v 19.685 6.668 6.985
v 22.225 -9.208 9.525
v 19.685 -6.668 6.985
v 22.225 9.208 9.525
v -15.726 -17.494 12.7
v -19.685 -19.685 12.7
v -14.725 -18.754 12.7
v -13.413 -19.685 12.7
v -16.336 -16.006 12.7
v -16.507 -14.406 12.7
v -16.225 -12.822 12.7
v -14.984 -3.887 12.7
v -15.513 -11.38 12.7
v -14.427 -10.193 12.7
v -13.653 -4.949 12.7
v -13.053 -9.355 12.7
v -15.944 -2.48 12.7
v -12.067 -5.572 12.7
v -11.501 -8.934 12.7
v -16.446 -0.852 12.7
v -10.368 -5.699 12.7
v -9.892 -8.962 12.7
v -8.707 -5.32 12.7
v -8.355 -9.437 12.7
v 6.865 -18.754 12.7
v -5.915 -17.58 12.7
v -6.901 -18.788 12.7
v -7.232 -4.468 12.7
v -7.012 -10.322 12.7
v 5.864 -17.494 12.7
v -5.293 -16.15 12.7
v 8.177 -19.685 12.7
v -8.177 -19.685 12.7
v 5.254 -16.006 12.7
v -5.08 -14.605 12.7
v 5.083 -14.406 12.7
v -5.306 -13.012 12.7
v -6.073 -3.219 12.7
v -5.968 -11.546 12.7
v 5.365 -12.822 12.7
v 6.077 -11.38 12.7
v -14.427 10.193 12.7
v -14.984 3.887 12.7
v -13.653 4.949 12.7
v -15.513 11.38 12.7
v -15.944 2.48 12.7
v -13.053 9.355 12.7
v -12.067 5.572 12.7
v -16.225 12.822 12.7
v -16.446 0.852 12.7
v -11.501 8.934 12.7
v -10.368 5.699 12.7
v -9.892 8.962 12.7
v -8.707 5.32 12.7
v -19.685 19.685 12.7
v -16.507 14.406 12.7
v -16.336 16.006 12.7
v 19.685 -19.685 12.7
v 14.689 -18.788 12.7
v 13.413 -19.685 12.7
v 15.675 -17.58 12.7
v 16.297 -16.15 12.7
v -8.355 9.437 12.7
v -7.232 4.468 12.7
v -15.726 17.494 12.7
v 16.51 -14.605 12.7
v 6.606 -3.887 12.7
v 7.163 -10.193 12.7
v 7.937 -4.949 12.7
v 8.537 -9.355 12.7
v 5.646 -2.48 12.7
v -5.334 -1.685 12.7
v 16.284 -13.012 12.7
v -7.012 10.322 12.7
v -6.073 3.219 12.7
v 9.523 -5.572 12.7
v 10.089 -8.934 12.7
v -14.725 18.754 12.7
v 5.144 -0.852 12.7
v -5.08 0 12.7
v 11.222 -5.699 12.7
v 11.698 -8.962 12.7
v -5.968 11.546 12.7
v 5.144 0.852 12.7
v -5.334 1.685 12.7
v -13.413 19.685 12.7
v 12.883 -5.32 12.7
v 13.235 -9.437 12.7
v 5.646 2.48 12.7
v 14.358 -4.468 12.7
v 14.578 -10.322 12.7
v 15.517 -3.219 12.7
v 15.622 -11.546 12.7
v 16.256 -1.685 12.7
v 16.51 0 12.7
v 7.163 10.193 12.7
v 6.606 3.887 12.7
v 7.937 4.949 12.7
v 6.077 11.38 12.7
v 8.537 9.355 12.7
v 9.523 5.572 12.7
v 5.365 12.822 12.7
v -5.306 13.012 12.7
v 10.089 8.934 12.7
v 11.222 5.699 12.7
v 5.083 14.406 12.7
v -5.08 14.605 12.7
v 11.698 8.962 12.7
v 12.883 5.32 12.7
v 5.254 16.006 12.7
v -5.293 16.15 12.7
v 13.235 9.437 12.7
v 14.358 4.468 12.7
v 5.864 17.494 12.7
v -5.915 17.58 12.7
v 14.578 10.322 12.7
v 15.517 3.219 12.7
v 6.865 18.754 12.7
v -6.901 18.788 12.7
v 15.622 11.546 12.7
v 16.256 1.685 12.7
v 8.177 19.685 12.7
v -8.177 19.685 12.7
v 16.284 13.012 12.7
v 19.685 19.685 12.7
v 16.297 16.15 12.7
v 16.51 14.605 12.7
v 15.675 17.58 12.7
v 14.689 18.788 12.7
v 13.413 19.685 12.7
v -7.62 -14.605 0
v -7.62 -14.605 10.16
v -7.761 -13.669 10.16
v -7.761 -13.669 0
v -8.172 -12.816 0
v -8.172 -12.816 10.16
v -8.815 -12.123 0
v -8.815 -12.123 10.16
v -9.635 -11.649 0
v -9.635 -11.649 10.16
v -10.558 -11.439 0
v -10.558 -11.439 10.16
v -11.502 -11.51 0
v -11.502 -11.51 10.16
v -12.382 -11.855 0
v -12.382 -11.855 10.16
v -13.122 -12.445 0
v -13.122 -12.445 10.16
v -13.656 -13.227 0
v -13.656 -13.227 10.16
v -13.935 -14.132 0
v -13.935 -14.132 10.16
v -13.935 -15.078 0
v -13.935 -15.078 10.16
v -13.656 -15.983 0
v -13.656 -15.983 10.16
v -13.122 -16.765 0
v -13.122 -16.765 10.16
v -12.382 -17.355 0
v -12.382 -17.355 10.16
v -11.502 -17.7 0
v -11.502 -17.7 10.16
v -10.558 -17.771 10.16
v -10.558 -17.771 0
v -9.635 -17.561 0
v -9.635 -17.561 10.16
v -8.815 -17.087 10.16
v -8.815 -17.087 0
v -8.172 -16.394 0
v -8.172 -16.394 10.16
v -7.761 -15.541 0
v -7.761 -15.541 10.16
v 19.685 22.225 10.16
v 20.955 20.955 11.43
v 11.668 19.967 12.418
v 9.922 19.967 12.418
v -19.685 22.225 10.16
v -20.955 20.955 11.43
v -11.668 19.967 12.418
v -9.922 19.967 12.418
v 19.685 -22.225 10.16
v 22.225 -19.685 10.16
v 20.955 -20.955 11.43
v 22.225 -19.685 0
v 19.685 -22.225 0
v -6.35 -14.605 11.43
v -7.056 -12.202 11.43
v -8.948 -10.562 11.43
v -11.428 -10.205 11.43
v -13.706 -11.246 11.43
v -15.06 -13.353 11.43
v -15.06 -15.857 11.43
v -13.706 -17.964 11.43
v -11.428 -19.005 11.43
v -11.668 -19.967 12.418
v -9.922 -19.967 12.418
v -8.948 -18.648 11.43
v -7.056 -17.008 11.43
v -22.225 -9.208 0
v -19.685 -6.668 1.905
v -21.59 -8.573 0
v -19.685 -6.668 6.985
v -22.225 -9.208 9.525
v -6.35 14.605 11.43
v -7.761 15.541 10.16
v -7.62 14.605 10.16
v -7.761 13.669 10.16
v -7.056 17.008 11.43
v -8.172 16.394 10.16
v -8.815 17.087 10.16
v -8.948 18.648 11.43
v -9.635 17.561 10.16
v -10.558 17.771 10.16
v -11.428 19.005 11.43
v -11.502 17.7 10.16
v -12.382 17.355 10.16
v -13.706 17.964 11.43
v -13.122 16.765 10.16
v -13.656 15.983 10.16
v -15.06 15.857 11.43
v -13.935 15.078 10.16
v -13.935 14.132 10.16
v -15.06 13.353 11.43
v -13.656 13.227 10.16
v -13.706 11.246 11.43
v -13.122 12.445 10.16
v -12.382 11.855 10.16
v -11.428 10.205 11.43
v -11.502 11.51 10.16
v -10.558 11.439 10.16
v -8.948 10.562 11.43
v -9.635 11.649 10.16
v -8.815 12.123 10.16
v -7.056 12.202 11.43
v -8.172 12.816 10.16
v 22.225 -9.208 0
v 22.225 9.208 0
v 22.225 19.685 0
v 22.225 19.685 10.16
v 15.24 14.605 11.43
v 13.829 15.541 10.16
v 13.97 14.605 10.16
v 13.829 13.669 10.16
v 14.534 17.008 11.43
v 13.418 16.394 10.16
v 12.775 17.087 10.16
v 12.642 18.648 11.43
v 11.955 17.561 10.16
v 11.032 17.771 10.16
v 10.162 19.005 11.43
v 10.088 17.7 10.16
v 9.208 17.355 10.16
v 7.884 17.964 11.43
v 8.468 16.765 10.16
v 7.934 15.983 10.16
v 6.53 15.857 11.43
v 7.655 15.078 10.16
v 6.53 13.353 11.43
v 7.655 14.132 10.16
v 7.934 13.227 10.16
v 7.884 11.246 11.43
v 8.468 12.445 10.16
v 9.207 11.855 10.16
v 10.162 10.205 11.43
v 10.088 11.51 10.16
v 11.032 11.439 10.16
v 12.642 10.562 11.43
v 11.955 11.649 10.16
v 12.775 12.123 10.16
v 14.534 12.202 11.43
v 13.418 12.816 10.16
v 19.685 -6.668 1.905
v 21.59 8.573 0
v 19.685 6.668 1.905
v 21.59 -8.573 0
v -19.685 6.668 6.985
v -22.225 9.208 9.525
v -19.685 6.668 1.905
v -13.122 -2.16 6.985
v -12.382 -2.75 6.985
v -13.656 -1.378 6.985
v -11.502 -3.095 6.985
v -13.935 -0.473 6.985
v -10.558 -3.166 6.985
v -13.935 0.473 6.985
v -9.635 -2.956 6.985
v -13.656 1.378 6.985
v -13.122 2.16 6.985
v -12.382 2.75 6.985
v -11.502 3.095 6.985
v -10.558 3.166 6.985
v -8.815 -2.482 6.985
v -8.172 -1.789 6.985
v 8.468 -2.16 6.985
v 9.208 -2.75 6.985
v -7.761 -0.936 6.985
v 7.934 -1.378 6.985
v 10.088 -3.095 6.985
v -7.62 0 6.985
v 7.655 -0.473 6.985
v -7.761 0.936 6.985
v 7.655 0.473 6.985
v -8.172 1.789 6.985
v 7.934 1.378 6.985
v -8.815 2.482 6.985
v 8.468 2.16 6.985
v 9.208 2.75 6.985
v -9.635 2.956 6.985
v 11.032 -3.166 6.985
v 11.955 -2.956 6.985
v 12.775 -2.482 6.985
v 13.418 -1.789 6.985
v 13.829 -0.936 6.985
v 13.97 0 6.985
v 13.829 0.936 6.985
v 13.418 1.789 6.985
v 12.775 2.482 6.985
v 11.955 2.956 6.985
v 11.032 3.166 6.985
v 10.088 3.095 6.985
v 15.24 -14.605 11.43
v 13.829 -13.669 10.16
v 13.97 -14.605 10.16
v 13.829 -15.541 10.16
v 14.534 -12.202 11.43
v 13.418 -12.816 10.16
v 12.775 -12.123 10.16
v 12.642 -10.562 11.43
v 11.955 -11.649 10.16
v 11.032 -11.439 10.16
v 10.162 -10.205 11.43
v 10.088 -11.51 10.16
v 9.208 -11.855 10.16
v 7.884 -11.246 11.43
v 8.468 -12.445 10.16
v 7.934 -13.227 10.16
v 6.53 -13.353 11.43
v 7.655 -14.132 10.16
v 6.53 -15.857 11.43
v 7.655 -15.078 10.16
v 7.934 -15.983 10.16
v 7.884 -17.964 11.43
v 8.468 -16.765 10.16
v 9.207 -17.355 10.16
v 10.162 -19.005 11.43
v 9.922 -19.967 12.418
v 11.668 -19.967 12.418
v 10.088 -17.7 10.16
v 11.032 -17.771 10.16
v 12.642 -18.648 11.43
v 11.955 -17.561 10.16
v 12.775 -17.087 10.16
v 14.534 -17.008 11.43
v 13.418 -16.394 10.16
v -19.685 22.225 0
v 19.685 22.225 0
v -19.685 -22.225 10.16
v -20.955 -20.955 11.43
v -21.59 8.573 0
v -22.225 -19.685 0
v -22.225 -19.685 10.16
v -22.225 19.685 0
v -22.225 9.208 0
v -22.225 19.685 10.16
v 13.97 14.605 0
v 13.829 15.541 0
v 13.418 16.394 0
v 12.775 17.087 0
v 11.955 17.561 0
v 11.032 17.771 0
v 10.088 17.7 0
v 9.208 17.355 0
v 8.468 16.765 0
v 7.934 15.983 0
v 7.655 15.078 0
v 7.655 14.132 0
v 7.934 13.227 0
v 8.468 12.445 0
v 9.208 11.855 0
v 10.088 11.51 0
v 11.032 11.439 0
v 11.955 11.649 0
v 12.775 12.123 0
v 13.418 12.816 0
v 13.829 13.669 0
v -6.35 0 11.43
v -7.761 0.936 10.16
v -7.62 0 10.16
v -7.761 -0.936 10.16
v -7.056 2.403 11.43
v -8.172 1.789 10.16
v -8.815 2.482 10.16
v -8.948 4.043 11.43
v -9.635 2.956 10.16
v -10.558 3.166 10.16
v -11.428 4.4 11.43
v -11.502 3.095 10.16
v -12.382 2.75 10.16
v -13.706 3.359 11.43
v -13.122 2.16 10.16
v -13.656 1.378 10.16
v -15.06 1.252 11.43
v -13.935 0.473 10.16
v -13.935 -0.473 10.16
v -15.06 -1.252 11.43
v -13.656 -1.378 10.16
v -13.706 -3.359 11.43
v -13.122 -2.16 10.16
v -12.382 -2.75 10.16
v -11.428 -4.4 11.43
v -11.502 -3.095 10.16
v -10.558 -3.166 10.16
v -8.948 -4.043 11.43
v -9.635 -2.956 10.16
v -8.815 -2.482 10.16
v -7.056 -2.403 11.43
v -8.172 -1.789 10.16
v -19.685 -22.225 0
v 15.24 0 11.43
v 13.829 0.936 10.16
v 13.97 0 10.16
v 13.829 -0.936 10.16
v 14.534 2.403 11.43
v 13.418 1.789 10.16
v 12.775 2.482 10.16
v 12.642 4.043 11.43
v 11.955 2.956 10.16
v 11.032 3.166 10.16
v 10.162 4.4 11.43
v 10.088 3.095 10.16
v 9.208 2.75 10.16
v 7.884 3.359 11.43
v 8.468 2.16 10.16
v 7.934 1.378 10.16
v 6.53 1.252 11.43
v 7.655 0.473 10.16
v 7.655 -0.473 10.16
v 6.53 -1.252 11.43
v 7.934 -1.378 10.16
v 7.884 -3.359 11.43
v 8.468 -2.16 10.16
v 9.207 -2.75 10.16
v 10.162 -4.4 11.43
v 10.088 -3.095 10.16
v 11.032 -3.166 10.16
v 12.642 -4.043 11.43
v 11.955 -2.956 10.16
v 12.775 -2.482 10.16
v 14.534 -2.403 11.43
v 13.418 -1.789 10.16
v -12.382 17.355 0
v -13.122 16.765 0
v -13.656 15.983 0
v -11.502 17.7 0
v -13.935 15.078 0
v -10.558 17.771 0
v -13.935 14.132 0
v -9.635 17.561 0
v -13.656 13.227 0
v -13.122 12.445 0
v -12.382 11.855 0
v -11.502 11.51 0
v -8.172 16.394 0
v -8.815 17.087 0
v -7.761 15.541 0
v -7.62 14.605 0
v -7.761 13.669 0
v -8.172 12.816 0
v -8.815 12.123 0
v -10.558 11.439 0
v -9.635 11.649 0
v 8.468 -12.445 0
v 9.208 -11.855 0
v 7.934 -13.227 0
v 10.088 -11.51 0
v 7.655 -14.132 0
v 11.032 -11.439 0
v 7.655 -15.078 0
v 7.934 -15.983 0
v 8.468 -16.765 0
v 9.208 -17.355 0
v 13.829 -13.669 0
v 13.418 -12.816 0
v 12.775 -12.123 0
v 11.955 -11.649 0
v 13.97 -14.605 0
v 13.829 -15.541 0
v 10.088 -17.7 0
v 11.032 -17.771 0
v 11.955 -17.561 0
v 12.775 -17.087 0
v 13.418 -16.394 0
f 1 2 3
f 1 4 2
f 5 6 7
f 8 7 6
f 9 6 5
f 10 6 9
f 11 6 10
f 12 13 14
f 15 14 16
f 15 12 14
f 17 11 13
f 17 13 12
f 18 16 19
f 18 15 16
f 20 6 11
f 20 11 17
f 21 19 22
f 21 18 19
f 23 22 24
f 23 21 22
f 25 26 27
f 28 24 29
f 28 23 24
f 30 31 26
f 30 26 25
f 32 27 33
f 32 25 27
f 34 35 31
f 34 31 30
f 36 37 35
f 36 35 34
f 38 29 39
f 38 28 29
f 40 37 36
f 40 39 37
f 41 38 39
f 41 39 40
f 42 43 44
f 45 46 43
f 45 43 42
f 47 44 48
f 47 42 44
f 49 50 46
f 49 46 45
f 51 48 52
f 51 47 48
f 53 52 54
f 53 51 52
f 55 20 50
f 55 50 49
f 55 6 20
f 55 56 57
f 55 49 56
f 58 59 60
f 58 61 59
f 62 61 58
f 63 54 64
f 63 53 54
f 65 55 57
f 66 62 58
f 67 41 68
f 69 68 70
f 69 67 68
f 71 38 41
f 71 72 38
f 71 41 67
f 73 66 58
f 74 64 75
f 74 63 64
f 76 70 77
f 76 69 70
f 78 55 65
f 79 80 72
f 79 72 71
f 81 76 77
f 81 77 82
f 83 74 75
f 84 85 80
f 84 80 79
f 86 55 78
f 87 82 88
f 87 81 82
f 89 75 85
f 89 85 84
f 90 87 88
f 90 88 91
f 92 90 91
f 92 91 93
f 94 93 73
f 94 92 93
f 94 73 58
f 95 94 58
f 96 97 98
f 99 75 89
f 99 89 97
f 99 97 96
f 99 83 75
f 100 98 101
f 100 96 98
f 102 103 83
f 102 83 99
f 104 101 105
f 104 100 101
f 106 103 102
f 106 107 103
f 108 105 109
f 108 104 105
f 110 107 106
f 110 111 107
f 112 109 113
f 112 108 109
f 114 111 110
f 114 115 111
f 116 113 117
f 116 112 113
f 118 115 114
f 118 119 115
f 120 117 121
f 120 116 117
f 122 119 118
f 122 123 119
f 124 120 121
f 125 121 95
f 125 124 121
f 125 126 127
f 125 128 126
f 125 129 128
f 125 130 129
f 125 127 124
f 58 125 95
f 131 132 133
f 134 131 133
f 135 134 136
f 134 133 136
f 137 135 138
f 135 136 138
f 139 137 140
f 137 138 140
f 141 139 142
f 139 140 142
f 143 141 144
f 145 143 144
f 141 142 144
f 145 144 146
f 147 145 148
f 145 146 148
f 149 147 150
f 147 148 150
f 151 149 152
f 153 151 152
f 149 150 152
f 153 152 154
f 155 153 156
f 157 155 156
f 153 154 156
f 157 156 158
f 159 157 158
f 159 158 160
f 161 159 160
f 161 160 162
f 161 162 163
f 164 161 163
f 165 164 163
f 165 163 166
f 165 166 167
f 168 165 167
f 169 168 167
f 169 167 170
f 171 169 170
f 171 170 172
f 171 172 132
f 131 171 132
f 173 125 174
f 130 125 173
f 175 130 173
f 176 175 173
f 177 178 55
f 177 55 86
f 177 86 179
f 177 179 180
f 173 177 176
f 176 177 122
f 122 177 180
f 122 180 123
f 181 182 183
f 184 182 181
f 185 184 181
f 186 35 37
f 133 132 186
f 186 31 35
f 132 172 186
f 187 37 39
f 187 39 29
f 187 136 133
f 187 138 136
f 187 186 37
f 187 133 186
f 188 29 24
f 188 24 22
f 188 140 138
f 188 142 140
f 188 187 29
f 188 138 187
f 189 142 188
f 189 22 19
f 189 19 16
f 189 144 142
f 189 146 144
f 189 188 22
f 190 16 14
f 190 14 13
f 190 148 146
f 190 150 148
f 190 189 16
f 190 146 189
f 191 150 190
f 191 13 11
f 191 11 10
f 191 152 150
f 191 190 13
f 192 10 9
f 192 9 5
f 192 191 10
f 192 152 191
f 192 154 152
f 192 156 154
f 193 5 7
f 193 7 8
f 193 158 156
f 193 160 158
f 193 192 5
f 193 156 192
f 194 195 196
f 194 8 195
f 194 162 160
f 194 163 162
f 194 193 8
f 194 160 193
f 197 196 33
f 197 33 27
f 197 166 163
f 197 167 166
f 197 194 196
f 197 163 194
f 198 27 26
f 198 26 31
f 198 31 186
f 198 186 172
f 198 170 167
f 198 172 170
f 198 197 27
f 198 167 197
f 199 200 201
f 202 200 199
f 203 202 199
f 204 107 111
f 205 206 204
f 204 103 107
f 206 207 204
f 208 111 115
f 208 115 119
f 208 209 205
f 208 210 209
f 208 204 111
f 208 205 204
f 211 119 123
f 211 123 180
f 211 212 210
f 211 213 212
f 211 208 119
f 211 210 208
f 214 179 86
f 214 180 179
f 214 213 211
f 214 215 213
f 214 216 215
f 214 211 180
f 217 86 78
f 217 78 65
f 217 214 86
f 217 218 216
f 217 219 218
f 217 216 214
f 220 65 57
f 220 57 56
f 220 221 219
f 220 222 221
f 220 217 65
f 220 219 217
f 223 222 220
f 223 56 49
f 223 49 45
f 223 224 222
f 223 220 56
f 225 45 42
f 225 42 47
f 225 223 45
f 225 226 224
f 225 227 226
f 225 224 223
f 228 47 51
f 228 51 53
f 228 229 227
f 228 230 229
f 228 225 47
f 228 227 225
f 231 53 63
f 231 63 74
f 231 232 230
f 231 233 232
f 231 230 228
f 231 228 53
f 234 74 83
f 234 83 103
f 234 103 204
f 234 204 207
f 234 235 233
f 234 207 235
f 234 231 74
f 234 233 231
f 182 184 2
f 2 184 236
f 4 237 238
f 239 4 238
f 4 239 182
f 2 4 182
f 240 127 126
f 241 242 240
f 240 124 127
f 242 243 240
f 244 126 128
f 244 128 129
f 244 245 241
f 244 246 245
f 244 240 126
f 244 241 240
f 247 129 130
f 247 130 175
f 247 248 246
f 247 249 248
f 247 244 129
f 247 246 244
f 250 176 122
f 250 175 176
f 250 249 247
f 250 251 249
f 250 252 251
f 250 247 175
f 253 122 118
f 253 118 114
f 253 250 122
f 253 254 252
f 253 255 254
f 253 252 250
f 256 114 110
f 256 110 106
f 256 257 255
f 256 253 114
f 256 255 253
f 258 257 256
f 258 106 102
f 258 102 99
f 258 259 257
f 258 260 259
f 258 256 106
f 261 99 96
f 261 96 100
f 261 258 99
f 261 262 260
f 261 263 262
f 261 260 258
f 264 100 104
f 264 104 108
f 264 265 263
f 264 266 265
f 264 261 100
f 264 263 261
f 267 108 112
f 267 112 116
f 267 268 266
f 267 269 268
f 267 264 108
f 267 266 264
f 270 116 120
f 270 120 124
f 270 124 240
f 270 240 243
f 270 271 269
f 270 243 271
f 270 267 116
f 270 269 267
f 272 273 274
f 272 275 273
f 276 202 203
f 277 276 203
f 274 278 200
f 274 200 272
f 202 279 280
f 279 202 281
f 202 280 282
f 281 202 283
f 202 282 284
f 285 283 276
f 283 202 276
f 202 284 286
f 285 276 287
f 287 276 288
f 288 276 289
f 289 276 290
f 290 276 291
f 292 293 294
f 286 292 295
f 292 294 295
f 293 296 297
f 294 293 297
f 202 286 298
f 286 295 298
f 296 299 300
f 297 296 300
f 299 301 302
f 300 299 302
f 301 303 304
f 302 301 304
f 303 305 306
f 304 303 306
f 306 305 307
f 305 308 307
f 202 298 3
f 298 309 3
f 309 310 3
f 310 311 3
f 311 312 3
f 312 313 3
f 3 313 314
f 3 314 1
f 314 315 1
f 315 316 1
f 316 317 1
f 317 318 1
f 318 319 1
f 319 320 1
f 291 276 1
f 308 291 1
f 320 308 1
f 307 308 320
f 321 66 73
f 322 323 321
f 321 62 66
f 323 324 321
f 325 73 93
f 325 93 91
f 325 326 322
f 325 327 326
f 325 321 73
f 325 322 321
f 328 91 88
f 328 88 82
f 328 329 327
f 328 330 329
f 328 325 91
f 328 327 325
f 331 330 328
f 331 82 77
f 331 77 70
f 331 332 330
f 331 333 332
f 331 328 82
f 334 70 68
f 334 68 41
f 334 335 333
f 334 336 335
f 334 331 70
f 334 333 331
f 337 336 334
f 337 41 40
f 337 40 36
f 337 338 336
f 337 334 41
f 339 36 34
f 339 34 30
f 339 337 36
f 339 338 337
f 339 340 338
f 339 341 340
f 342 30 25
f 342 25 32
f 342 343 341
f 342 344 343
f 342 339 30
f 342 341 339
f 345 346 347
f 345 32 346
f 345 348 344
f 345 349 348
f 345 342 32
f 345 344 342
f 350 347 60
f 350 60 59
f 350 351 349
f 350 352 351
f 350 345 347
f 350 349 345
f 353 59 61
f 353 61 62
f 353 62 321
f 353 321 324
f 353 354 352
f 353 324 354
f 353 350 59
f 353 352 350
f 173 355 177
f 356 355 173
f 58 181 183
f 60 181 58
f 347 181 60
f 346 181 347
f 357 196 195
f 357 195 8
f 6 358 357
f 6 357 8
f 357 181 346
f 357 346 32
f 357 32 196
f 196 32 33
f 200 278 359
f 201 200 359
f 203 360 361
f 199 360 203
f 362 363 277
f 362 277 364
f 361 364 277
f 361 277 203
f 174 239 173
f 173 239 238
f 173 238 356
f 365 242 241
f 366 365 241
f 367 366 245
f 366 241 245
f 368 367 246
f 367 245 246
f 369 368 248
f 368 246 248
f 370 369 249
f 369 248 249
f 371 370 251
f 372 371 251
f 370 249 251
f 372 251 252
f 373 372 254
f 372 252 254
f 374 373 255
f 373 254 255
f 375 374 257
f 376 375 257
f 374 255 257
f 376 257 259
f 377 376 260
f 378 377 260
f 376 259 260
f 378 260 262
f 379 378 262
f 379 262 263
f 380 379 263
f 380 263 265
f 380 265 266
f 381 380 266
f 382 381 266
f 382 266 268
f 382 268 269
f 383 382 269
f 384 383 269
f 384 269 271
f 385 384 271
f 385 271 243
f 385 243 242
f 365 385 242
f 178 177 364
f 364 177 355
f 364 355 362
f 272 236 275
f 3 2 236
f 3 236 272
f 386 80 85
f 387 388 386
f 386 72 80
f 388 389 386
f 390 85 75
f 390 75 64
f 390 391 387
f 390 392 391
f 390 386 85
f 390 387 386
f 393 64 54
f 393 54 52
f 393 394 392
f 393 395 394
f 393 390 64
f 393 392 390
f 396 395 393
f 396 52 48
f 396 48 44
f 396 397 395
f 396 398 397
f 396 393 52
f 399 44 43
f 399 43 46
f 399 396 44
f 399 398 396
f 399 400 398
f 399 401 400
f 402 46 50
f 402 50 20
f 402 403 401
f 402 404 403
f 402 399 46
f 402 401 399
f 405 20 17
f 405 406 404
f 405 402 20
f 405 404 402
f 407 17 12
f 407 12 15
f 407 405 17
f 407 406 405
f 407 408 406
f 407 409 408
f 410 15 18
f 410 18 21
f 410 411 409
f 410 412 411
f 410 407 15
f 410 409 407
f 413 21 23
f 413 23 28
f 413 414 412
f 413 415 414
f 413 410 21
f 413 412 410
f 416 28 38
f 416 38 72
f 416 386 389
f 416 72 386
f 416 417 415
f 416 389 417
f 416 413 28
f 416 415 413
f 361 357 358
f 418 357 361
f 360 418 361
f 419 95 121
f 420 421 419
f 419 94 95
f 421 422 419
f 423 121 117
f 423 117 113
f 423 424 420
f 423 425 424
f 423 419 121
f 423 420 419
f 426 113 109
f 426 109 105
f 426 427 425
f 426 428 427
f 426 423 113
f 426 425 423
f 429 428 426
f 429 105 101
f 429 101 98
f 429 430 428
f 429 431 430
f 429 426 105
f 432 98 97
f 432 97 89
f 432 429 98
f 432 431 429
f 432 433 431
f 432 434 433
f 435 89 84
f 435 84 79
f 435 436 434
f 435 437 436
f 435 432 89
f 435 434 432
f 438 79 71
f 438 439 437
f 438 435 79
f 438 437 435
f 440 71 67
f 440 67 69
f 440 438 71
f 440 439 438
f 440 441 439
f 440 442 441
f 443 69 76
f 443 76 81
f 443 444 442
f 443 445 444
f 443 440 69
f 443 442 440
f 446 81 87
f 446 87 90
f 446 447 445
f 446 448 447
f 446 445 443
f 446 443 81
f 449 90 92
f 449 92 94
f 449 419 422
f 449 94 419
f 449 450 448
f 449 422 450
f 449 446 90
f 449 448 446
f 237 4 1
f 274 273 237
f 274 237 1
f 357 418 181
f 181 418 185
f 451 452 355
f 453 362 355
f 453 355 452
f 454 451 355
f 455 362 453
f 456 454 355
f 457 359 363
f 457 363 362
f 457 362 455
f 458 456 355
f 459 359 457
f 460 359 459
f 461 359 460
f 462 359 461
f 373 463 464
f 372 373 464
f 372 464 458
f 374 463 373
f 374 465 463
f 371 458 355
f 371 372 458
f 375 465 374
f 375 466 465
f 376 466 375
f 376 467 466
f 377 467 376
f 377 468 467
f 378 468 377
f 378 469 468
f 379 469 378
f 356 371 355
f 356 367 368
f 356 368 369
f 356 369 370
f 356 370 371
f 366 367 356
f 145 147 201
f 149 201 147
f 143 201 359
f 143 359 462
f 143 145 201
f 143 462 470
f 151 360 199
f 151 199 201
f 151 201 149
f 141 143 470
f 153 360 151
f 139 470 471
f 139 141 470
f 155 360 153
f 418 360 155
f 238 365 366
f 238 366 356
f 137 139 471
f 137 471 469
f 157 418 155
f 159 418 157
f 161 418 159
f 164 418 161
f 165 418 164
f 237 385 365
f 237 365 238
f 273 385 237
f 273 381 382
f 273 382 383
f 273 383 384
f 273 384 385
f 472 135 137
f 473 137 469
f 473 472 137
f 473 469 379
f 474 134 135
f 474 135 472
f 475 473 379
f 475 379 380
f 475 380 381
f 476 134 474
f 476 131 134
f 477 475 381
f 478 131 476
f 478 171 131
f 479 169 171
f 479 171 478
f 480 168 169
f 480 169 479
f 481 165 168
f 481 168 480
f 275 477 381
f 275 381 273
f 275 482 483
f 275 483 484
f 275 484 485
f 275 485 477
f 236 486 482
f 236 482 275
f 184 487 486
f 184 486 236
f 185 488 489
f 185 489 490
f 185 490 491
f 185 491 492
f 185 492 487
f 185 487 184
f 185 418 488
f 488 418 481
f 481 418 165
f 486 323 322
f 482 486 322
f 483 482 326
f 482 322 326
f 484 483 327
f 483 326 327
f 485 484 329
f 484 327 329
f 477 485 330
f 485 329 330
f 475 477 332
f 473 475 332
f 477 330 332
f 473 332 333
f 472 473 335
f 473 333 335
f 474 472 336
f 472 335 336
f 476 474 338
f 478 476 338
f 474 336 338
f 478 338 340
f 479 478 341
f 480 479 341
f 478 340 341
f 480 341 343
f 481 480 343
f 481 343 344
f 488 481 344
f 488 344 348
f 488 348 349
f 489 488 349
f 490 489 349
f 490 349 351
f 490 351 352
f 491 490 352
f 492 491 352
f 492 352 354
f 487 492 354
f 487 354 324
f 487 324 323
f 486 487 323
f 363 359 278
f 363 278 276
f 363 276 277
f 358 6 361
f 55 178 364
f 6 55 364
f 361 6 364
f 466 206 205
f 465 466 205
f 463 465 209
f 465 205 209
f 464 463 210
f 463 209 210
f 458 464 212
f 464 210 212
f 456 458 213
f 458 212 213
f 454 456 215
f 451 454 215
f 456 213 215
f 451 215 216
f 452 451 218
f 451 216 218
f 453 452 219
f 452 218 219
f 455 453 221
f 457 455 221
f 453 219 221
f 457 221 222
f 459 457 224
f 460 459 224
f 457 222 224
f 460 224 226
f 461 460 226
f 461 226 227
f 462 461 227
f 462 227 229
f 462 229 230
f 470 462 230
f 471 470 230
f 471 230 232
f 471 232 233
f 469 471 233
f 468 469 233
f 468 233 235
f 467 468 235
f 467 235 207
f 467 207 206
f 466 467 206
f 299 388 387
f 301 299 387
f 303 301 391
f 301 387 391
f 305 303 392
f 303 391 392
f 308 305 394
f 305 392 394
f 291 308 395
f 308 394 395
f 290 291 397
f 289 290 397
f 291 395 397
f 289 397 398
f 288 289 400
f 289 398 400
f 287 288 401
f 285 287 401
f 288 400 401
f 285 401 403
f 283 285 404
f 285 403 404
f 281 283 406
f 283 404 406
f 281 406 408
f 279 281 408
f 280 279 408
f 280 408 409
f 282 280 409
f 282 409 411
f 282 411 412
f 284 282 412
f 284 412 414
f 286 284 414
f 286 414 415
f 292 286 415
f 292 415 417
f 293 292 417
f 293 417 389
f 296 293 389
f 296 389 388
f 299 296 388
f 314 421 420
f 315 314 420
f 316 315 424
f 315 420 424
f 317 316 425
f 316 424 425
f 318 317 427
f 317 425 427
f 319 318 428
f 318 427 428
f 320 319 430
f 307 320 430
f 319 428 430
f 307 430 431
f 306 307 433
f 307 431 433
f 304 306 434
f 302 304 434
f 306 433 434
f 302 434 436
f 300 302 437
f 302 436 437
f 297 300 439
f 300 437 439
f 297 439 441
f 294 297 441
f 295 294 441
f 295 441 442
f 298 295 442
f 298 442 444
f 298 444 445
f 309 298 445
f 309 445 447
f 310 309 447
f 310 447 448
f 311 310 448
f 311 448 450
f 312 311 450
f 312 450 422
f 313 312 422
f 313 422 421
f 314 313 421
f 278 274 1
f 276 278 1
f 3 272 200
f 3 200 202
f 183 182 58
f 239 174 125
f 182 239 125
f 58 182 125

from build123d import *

# Parameters (mm, degrees)
F0_W          = 44.45
F0_H          = 44.45
F1_DEPTH      = 12.7
F2_W          = 13.335
F2_H          = 5.08
F3_DEPTH      = 76.2
F4_R          = 3.175
F5_DEPTH      = 25.4
F6_T1_DEPTH   = 57.5141495789
F6_T3_DEPTH   = 57.5141495789
F7_T1_DEPTH   = 5.08
F7_T3_DEPTH   = 13.335
F7_T5_DEPTH   = 23.2241495789
F7_T11_DEPTH  = 19.8670747894
F7_T16_DEPTH  = 11.6120747894
F7_T24_DEPTH  = 19.8670747894
F7_T28_DEPTH  = 11.6120747894
F7_T36_DEPTH  = 11.6120747894
F7_T41_DEPTH  = 19.8670747894
F7_T49_DEPTH  = 11.6120747894
F7_T54_DEPTH  = 19.8670747894
F7_T61_DEPTH  = 19.8670747894
F7_T65_DEPTH  = 11.6120747894
F7_T73_DEPTH  = 11.6120747894
F7_T78_DEPTH  = 19.8670747894
F7_T85_DEPTH  = 19.8670747894
F7_T90_DEPTH  = 11.6120747894
F7_T98_DEPTH  = 11.6120747894
F7_T103_DEPTH = 19.8670747894
F8_R          = 3.175
F9_DEPTH      = 1.905


# Not quite as in the source:
# - a fillet or chamfer that OpenCascade refuses, or shapes differently, is made with other operations: its cross-section is extruded or revolved along the edge and cut away or added


with BuildPart() as f1:
    # F0 (on Top) → F1 (new body)
    with BuildSketch(Plane.XY):
        Rectangle(F0_W, F0_H)
    extrude(amount=F1_DEPTH)

    # F2 (on face) → F3 (cut)
    with BuildSketch(Plane.YZ.offset(22.225)):
        with Locations((0, 4.445)):
            Rectangle(F2_W, F2_H)
    extrude(amount=-F3_DEPTH, mode=Mode.SUBTRACT)

    # F4 (on face) → F5 (cut)
    with BuildSketch(Plane.XY.offset(12.7)):
        with Locations((10.795, 14.605)):
            Circle(F4_R)
        with Locations((-10.795, 14.605)):
            Circle(F4_R)
        with Locations((-10.795, -14.605)):
            Circle(F4_R)
        with Locations((10.795, -14.605)):
            Circle(F4_R)
        with Locations((-10.795, 0)):
            Circle(F4_R)
        with Locations((10.795, 0)):
            Circle(F4_R)
    extrude(amount=-F5_DEPTH, mode=Mode.SUBTRACT)

    # F6: chamfer of 2.54 on 10 edges, made by hand

    # F6_s2 → F6_t1 (cut)
    with BuildSketch(Plane.XZ.offset(-28.7570747894)):
        Polygon((22.225, 10.16), (19.685, 12.7), (22.225, 12.7), align=None)
        Polygon((-19.685, 12.7), (-22.225, 10.16), (-22.225, 12.7), align=None)
    extrude(amount=F6_T1_DEPTH, mode=Mode.SUBTRACT)

    # F6_s4 → F6_t3 (cut)
    with BuildSketch(Plane.YZ.offset(-28.7570747894)):
        Polygon((-22.225, 10.16), (-19.685, 12.7), (-22.225, 12.7), align=None)
        Polygon((19.685, 12.7), (22.225, 10.16), (22.225, 12.7), align=None)
    extrude(amount=F6_T3_DEPTH, mode=Mode.SUBTRACT)

    # F6_s5 → F6_t6 (revolve, cut)
    with BuildSketch(Plane.XZ.offset(14.605)):
        Polygon((-5.08, 12.7), (-7.62, 10.16), (-7.62, 12.7), align=None)
    revolve(axis=Axis((-10.795, -14.605, 12.7), (0, 0, 1)), mode=Mode.SUBTRACT)

    # F6_s7 → F6_t8 (revolve, cut)
    with BuildSketch(Plane.XZ):
        Polygon((-5.08, 12.7), (-7.62, 10.16), (-7.62, 12.7), align=None)
    revolve(axis=Axis((-10.795, 0, 12.7), (0, 0, 1)), mode=Mode.SUBTRACT)

    # F6_s9 → F6_t10 (revolve, cut)
    with BuildSketch(Plane.XZ.offset(14.605)):
        Polygon((16.51, 12.7), (13.97, 10.16), (13.97, 12.7), align=None)
    revolve(axis=Axis((10.795, -14.605, 12.7), (0, 0, 1)), mode=Mode.SUBTRACT)

    # F6_s11 → F6_t12 (revolve, cut)
    with BuildSketch(Plane.XZ):
        Polygon((16.51, 12.7), (13.97, 10.16), (13.97, 12.7), align=None)
    revolve(axis=Axis((10.795, 0, 12.7), (0, 0, 1)), mode=Mode.SUBTRACT)

    # F6_s13 → F6_t14 (revolve, cut)
    with BuildSketch(Plane.XZ.offset(-14.605)):
        Polygon((-5.08, 12.7), (-7.62, 10.16), (-7.62, 12.7), align=None)
    revolve(axis=Axis((-10.795, 14.605, 12.7), (0, 0, 1)), mode=Mode.SUBTRACT)

    # F6_s15 → F6_t16 (revolve, cut)
    with BuildSketch(Plane.XZ.offset(-14.605)):
        Polygon((16.51, 12.7), (13.97, 10.16), (13.97, 12.7), align=None)
    revolve(axis=Axis((10.795, 14.605, 12.7), (0, 0, 1)), mode=Mode.SUBTRACT)

    # F7: chamfer of 2.54 on 12 edges, made by hand

    # F7_s2 → F7_t1 (cut)
    with BuildSketch(Plane.XY.offset(1.905)):
        Polygon((22.225, 9.2075), (19.685, 6.6675), (22.225, 6.6675), align=None)
        Polygon((22.225, -9.2075), (19.685, -6.6675), (22.225, -6.6675), align=None)
        Polygon((-19.685, 6.6675), (-22.225, 9.2075), (-22.225, 6.6675), align=None)
        Polygon((-19.685, -6.6675), (-22.225, -9.2075), (-22.225, -6.6675), align=None)
    extrude(amount=F7_T1_DEPTH, mode=Mode.SUBTRACT)

    # F7_s4 → F7_t3 (cut)
    with BuildSketch(Plane.XZ.offset(-6.6675)):
        Polygon((22.225, -0.635), (19.685, 1.905), (22.225, 1.905), align=None)
        Polygon((22.225, 9.525), (19.685, 6.985), (22.225, 6.985), align=None)
        Polygon((-19.685, 6.985), (-22.225, 9.525), (-22.225, 6.985), align=None)
        Polygon((-19.685, 1.905), (-22.225, -0.635), (-22.225, 1.905), align=None)
    extrude(amount=F7_T3_DEPTH, mode=Mode.SUBTRACT)

    # F7_s6 → F7_t5 (cut)
    with BuildSketch(Plane.XY.offset(-6.5320747894)):
        Polygon((-19.685, -22.225), (-22.225, -19.685), (-22.225, -22.225), align=None)
        Polygon((22.225, -19.685), (19.685, -22.225), (22.225, -22.225), align=None)
        Polygon((22.225, 19.685), (19.685, 22.225), (22.225, 22.225), align=None)
        Polygon((-19.685, 22.225), (-22.225, 19.685), (-22.225, 22.225), align=None)
    extrude(amount=F7_T5_DEPTH, mode=Mode.SUBTRACT)


with BuildPart() as f7_tool9:
    # F7_s10 → F7_t11 (new body)
    with BuildSketch(Plane.XZ.offset(6.6675)):
        Polygon((22.225, -0.635), (19.685, 1.905), (22.225, 1.905), align=None)
    extrude(amount=-F7_T11_DEPTH)

    split(bisect_by=Plane.XY, keep=Keep.TOP)

    split(bisect_by=Plane.XZ.offset(-6.6675), keep=Keep.BOTTOM)


with BuildPart() as f7_tool14:
    # F7_s15 → F7_t16 (new body)
    with BuildSketch(Plane.XY.offset(-4.6270747894)):
        Polygon((22.225, 9.2075), (19.685, 6.6675), (22.225, 6.6675), align=None)
    extrude(amount=F7_T16_DEPTH)

    split(bisect_by=Plane.XY, keep=Keep.TOP)

    split(bisect_by=Plane.XY.offset(1.905), keep=Keep.BOTTOM)


with BuildPart() as f7_tool9_1:
    add(f7_tool9.part)

    # F7_t19: intersect F7_tool14
    add(f7_tool14.part, mode=Mode.INTERSECT)


with BuildPart() as f1_1:
    add(f1.part)

    # F7_t7: cut F7_tool9
    add(f7_tool9_1.part, mode=Mode.SUBTRACT)


with BuildPart() as f7_tool22:
    # F7_s23 → F7_t24 (new body)
    with BuildSketch(Plane.XZ.offset(-13.1995747894)):
        Polygon((22.225, 9.525), (19.685, 6.985), (22.225, 6.985), align=None)
    extrude(amount=F7_T24_DEPTH)

    split(bisect_by=Plane.XZ.offset(-6.6675), keep=Keep.BOTTOM)


with BuildPart() as f7_tool26:
    # F7_s27 → F7_t28 (new body)
    with BuildSketch(Plane.XY.offset(1.905)):
        Polygon((22.225, 9.2075), (19.685, 6.6675), (22.225, 6.6675), align=None)
    extrude(amount=F7_T28_DEPTH)

    split(bisect_by=Plane(origin=(16.1925, 0, 16.1925), x_dir=(0, 1, 0), z_dir=(-0.7071067812, 0, -0.7071067812)), keep=Keep.TOP)

    split(bisect_by=Plane.XY.offset(6.985), keep=Keep.TOP)


with BuildPart() as f7_tool22_1:
    add(f7_tool22.part)

    # F7_t31: intersect F7_tool26
    add(f7_tool26.part, mode=Mode.INTERSECT)


with BuildPart() as f1_2:
    add(f1_1.part)

    # F7_t20: cut F7_tool22
    add(f7_tool22_1.part, mode=Mode.SUBTRACT)


with BuildPart() as f7_tool34:
    # F7_s35 → F7_t36 (new body)
    with BuildSketch(Plane.XY.offset(6.985)):
        Polygon((22.225, -9.2075), (19.685, -6.6675), (22.225, -6.6675), align=None)
    extrude(amount=-F7_T36_DEPTH)

    split(bisect_by=Plane.XY, keep=Keep.TOP)

    split(bisect_by=Plane.XY.offset(1.905), keep=Keep.BOTTOM)


with BuildPart() as f7_tool39:
    # F7_s40 → F7_t41 (new body)
    with BuildSketch(Plane.XZ.offset(13.1995747894)):
        Polygon((22.225, -0.635), (19.685, 1.905), (22.225, 1.905), align=None)
    extrude(amount=-F7_T41_DEPTH)

    split(bisect_by=Plane.XY, keep=Keep.TOP)

    split(bisect_by=Plane.XZ.offset(6.6675), keep=Keep.TOP)


with BuildPart() as f7_tool34_1:
    add(f7_tool34.part)

    # F7_t44: intersect F7_tool39
    add(f7_tool39.part, mode=Mode.INTERSECT)


with BuildPart() as f1_3:
    add(f1_2.part)

    # F7_t32: cut F7_tool34
    add(f7_tool34_1.part, mode=Mode.SUBTRACT)


with BuildPart() as f7_tool47:
    # F7_s48 → F7_t49 (new body)
    with BuildSketch(Plane.XY.offset(13.5170747894)):
        Polygon((22.225, -9.2075), (19.685, -6.6675), (22.225, -6.6675), align=None)
    extrude(amount=-F7_T49_DEPTH)

    split(bisect_by=Plane(origin=(16.1925, 0, 16.1925), x_dir=(0, 1, 0), z_dir=(-0.7071067812, 0, -0.7071067812)), keep=Keep.TOP)

    split(bisect_by=Plane.XY.offset(6.985), keep=Keep.TOP)


with BuildPart() as f7_tool52:
    # F7_s53 → F7_t54 (new body)
    with BuildSketch(Plane.XZ.offset(-6.6675)):
        Polygon((22.225, 9.525), (19.685, 6.985), (22.225, 6.985), align=None)
    extrude(amount=F7_T54_DEPTH)

    split(bisect_by=Plane.XZ.offset(6.6675), keep=Keep.TOP)


with BuildPart() as f7_tool47_1:
    add(f7_tool47.part)

    # F7_t56: intersect F7_tool52
    add(f7_tool52.part, mode=Mode.INTERSECT)


with BuildPart() as f1_4:
    add(f1_3.part)

    # F7_t45: cut F7_tool47
    add(f7_tool47_1.part, mode=Mode.SUBTRACT)


with BuildPart() as f7_tool59:
    # F7_s60 → F7_t61 (new body)
    with BuildSketch(Plane.XZ.offset(-13.1995747894)):
        Polygon((-19.685, 6.985), (-22.225, 9.525), (-22.225, 6.985), align=None)
    extrude(amount=F7_T61_DEPTH)

    split(bisect_by=Plane.XZ.offset(-6.6675), keep=Keep.BOTTOM)


with BuildPart() as f7_tool63:
    # F7_s64 → F7_t65 (new body)
    with BuildSketch(Plane.XY.offset(1.905)):
        Polygon((-19.685, 6.6675), (-22.225, 9.2075), (-22.225, 6.6675), align=None)
    extrude(amount=F7_T65_DEPTH)

    split(bisect_by=Plane.XY.offset(6.985), keep=Keep.TOP)

    split(bisect_by=Plane(origin=(-16.1925, 0, 16.1925), x_dir=(0, 1, 0), z_dir=(0.7071067812, 0, -0.7071067812)), keep=Keep.TOP)


with BuildPart() as f7_tool59_1:
    add(f7_tool59.part)

    # F7_t68: intersect F7_tool63
    add(f7_tool63.part, mode=Mode.INTERSECT)


with BuildPart() as f1_5:
    add(f1_4.part)

    # F7_t57: cut F7_tool59
    add(f7_tool59_1.part, mode=Mode.SUBTRACT)


with BuildPart() as f7_tool71:
    # F7_s72 → F7_t73 (new body)
    with BuildSketch(Plane.XY.offset(13.5170747894)):
        Polygon((-19.685, -6.6675), (-22.225, -9.2075), (-22.225, -6.6675), align=None)
    extrude(amount=-F7_T73_DEPTH)

    split(bisect_by=Plane.XY.offset(6.985), keep=Keep.TOP)

    split(bisect_by=Plane(origin=(-16.1925, 0, 16.1925), x_dir=(0, 1, 0), z_dir=(0.7071067812, 0, -0.7071067812)), keep=Keep.TOP)


with BuildPart() as f7_tool76:
    # F7_s77 → F7_t78 (new body)
    with BuildSketch(Plane.XZ.offset(-6.6675)):
        Polygon((-19.685, 6.985), (-22.225, 9.525), (-22.225, 6.985), align=None)
    extrude(amount=F7_T78_DEPTH)

    split(bisect_by=Plane.XZ.offset(6.6675), keep=Keep.TOP)


with BuildPart() as f7_tool71_1:
    add(f7_tool71.part)

    # F7_t80: intersect F7_tool76
    add(f7_tool76.part, mode=Mode.INTERSECT)


with BuildPart() as f1_6:
    add(f1_5.part)

    # F7_t69: cut F7_tool71
    add(f7_tool71_1.part, mode=Mode.SUBTRACT)


with BuildPart() as f7_tool83:
    # F7_s84 → F7_t85 (new body)
    with BuildSketch(Plane.XZ.offset(6.6675)):
        Polygon((-19.685, 1.905), (-22.225, -0.635), (-22.225, 1.905), align=None)
    extrude(amount=-F7_T85_DEPTH)

    split(bisect_by=Plane.XY, keep=Keep.TOP)

    split(bisect_by=Plane.XZ.offset(-6.6675), keep=Keep.BOTTOM)


with BuildPart() as f7_tool88:
    # F7_s89 → F7_t90 (new body)
    with BuildSketch(Plane.XY.offset(-4.6270747894)):
        Polygon((-19.685, 6.6675), (-22.225, 9.2075), (-22.225, 6.6675), align=None)
    extrude(amount=F7_T90_DEPTH)

    split(bisect_by=Plane.XY, keep=Keep.TOP)

    split(bisect_by=Plane.XY.offset(1.905), keep=Keep.BOTTOM)


with BuildPart() as f7_tool83_1:
    add(f7_tool83.part)

    # F7_t93: intersect F7_tool88
    add(f7_tool88.part, mode=Mode.INTERSECT)


with BuildPart() as f1_7:
    add(f1_6.part)

    # F7_t81: cut F7_tool83
    add(f7_tool83_1.part, mode=Mode.SUBTRACT)


with BuildPart() as f7_tool96:
    # F7_s97 → F7_t98 (new body)
    with BuildSketch(Plane.XY.offset(6.985)):
        Polygon((-19.685, -6.6675), (-22.225, -9.2075), (-22.225, -6.6675), align=None)
    extrude(amount=-F7_T98_DEPTH)

    split(bisect_by=Plane.XY, keep=Keep.TOP)

    split(bisect_by=Plane.XY.offset(1.905), keep=Keep.BOTTOM)


with BuildPart() as f7_tool101:
    # F7_s102 → F7_t103 (new body)
    with BuildSketch(Plane.XZ.offset(13.1995747894)):
        Polygon((-19.685, 1.905), (-22.225, -0.635), (-22.225, 1.905), align=None)
    extrude(amount=-F7_T103_DEPTH)

    split(bisect_by=Plane.XY, keep=Keep.TOP)

    split(bisect_by=Plane.XZ.offset(6.6675), keep=Keep.TOP)


with BuildPart() as f7_tool96_1:
    add(f7_tool96.part)

    # F7_t106: intersect F7_tool101
    add(f7_tool101.part, mode=Mode.INTERSECT)


with BuildPart() as f1_8:
    add(f1_7.part)

    # F7_t94: cut F7_tool96
    add(f7_tool96_1.part, mode=Mode.SUBTRACT)

    # F8 (on face) → F9 (join, through all)
    with BuildSketch(Plane(origin=(0, 0, 0), x_dir=(1, 0, 0), z_dir=(0, 0, -1))):
        with Locations((10.795, 0)):
            Circle(F8_R)
        with Locations((-10.795, 0)):
            Circle(F8_R)
    extrude(amount=-F9_DEPTH)


solid = f1_8.part
